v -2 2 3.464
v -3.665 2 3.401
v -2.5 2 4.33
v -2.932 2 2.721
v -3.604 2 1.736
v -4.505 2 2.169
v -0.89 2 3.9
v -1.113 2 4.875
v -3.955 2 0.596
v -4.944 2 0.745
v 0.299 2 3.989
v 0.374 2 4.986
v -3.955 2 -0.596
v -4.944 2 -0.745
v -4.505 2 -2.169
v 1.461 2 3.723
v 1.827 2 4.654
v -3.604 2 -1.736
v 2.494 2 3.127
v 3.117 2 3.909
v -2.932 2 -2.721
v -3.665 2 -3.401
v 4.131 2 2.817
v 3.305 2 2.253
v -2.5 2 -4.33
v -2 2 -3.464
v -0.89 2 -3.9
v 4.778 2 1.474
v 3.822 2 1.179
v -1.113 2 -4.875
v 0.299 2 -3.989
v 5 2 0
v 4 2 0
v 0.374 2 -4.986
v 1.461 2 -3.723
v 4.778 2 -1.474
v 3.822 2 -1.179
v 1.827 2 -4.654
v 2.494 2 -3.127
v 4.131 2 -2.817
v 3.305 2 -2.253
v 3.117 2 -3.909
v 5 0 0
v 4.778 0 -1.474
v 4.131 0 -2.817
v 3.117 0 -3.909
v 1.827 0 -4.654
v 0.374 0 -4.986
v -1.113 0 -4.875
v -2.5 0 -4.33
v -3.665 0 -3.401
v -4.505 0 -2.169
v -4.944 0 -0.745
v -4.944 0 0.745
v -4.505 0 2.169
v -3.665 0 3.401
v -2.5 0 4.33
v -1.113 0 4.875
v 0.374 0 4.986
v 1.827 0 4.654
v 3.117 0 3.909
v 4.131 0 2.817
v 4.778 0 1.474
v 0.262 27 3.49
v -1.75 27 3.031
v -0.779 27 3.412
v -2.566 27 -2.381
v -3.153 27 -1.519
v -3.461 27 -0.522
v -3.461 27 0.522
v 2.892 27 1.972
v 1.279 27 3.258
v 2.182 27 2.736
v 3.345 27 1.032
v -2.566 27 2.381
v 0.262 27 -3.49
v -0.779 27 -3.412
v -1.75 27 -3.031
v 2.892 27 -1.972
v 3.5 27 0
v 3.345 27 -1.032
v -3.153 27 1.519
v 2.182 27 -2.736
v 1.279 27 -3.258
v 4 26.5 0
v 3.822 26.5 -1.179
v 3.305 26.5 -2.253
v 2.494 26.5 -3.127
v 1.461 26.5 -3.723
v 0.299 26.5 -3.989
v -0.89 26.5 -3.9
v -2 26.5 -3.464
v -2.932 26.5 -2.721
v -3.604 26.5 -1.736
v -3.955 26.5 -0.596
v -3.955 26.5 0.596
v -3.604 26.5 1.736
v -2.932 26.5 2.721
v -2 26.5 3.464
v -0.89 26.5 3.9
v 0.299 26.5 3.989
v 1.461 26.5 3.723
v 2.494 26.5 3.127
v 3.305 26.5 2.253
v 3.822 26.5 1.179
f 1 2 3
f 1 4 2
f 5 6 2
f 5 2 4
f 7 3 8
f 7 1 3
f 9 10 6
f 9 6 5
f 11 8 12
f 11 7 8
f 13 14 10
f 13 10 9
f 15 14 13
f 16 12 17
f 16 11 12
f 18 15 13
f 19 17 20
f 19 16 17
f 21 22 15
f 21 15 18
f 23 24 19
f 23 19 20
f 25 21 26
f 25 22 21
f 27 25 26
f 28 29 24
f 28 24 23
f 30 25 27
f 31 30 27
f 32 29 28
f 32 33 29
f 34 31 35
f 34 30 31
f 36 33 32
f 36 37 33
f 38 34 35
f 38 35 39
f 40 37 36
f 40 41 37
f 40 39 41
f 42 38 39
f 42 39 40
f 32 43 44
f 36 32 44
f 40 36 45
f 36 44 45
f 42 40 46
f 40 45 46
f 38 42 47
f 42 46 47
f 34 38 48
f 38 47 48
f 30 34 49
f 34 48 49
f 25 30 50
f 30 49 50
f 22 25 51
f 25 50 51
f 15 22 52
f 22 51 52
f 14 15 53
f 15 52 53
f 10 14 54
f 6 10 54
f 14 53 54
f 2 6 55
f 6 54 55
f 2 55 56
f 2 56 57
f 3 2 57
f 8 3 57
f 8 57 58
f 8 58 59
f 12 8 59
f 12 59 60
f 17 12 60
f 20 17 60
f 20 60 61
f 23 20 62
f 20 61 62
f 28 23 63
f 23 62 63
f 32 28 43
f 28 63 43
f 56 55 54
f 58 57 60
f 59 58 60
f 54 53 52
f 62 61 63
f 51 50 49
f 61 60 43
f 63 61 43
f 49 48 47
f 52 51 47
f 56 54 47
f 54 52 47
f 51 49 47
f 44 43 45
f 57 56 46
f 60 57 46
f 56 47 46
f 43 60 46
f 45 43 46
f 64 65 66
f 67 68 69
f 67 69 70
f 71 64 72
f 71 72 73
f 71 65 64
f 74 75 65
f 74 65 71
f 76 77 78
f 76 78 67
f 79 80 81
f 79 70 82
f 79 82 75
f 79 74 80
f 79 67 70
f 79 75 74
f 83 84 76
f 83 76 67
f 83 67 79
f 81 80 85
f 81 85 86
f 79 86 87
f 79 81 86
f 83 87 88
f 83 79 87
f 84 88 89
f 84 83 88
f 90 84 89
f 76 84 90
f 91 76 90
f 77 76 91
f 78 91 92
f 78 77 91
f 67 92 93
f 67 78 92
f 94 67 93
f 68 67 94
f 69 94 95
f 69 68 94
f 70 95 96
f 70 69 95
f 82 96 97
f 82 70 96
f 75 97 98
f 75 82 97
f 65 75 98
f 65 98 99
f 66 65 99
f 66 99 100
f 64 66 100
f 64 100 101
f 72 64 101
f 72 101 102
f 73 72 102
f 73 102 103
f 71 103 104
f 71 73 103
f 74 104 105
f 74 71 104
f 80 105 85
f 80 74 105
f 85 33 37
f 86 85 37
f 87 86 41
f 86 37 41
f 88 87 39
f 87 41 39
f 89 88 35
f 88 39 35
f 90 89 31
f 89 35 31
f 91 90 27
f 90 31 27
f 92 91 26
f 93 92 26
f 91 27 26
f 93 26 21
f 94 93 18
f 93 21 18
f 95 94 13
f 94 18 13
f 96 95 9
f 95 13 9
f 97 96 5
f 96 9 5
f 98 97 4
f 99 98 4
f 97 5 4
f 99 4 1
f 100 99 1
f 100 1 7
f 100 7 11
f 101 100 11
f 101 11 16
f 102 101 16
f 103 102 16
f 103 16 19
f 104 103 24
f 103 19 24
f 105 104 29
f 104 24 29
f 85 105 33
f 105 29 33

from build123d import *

# Parameters (mm, degrees)
SKETCH1_R           = 5
BOSS_EXTRUDE1_DEPTH = 2
SKETCH2_R           = 4
BOSS_EXTRUDE2_DEPTH = 25
CHAMFER1_SIZE       = 0.5


with BuildPart() as part:
    # Sketch1 → Boss-Extrude1 (new body)
    with BuildSketch(Plane(origin=(0, 0, 0), x_dir=(1, 0, 0), z_dir=(0, 1, 0))):
        Circle(SKETCH1_R)
    extrude(amount=BOSS_EXTRUDE1_DEPTH)

    # Sketch2 → Boss-Extrude2 (add)
    with BuildSketch(Plane(origin=(0, 2, 0), x_dir=(1, 0, 0), z_dir=(0, 1, 0))):
        Circle(SKETCH2_R)
    extrude(amount=BOSS_EXTRUDE2_DEPTH)

    # Chamfer1
    chamfer1_edges = [part.edges().sort_by_distance(p)[0] for p in [
        (-4, 27, 0),
    ]]
    chamfer(chamfer1_edges, length=CHAMFER1_SIZE)


solid = part.part
